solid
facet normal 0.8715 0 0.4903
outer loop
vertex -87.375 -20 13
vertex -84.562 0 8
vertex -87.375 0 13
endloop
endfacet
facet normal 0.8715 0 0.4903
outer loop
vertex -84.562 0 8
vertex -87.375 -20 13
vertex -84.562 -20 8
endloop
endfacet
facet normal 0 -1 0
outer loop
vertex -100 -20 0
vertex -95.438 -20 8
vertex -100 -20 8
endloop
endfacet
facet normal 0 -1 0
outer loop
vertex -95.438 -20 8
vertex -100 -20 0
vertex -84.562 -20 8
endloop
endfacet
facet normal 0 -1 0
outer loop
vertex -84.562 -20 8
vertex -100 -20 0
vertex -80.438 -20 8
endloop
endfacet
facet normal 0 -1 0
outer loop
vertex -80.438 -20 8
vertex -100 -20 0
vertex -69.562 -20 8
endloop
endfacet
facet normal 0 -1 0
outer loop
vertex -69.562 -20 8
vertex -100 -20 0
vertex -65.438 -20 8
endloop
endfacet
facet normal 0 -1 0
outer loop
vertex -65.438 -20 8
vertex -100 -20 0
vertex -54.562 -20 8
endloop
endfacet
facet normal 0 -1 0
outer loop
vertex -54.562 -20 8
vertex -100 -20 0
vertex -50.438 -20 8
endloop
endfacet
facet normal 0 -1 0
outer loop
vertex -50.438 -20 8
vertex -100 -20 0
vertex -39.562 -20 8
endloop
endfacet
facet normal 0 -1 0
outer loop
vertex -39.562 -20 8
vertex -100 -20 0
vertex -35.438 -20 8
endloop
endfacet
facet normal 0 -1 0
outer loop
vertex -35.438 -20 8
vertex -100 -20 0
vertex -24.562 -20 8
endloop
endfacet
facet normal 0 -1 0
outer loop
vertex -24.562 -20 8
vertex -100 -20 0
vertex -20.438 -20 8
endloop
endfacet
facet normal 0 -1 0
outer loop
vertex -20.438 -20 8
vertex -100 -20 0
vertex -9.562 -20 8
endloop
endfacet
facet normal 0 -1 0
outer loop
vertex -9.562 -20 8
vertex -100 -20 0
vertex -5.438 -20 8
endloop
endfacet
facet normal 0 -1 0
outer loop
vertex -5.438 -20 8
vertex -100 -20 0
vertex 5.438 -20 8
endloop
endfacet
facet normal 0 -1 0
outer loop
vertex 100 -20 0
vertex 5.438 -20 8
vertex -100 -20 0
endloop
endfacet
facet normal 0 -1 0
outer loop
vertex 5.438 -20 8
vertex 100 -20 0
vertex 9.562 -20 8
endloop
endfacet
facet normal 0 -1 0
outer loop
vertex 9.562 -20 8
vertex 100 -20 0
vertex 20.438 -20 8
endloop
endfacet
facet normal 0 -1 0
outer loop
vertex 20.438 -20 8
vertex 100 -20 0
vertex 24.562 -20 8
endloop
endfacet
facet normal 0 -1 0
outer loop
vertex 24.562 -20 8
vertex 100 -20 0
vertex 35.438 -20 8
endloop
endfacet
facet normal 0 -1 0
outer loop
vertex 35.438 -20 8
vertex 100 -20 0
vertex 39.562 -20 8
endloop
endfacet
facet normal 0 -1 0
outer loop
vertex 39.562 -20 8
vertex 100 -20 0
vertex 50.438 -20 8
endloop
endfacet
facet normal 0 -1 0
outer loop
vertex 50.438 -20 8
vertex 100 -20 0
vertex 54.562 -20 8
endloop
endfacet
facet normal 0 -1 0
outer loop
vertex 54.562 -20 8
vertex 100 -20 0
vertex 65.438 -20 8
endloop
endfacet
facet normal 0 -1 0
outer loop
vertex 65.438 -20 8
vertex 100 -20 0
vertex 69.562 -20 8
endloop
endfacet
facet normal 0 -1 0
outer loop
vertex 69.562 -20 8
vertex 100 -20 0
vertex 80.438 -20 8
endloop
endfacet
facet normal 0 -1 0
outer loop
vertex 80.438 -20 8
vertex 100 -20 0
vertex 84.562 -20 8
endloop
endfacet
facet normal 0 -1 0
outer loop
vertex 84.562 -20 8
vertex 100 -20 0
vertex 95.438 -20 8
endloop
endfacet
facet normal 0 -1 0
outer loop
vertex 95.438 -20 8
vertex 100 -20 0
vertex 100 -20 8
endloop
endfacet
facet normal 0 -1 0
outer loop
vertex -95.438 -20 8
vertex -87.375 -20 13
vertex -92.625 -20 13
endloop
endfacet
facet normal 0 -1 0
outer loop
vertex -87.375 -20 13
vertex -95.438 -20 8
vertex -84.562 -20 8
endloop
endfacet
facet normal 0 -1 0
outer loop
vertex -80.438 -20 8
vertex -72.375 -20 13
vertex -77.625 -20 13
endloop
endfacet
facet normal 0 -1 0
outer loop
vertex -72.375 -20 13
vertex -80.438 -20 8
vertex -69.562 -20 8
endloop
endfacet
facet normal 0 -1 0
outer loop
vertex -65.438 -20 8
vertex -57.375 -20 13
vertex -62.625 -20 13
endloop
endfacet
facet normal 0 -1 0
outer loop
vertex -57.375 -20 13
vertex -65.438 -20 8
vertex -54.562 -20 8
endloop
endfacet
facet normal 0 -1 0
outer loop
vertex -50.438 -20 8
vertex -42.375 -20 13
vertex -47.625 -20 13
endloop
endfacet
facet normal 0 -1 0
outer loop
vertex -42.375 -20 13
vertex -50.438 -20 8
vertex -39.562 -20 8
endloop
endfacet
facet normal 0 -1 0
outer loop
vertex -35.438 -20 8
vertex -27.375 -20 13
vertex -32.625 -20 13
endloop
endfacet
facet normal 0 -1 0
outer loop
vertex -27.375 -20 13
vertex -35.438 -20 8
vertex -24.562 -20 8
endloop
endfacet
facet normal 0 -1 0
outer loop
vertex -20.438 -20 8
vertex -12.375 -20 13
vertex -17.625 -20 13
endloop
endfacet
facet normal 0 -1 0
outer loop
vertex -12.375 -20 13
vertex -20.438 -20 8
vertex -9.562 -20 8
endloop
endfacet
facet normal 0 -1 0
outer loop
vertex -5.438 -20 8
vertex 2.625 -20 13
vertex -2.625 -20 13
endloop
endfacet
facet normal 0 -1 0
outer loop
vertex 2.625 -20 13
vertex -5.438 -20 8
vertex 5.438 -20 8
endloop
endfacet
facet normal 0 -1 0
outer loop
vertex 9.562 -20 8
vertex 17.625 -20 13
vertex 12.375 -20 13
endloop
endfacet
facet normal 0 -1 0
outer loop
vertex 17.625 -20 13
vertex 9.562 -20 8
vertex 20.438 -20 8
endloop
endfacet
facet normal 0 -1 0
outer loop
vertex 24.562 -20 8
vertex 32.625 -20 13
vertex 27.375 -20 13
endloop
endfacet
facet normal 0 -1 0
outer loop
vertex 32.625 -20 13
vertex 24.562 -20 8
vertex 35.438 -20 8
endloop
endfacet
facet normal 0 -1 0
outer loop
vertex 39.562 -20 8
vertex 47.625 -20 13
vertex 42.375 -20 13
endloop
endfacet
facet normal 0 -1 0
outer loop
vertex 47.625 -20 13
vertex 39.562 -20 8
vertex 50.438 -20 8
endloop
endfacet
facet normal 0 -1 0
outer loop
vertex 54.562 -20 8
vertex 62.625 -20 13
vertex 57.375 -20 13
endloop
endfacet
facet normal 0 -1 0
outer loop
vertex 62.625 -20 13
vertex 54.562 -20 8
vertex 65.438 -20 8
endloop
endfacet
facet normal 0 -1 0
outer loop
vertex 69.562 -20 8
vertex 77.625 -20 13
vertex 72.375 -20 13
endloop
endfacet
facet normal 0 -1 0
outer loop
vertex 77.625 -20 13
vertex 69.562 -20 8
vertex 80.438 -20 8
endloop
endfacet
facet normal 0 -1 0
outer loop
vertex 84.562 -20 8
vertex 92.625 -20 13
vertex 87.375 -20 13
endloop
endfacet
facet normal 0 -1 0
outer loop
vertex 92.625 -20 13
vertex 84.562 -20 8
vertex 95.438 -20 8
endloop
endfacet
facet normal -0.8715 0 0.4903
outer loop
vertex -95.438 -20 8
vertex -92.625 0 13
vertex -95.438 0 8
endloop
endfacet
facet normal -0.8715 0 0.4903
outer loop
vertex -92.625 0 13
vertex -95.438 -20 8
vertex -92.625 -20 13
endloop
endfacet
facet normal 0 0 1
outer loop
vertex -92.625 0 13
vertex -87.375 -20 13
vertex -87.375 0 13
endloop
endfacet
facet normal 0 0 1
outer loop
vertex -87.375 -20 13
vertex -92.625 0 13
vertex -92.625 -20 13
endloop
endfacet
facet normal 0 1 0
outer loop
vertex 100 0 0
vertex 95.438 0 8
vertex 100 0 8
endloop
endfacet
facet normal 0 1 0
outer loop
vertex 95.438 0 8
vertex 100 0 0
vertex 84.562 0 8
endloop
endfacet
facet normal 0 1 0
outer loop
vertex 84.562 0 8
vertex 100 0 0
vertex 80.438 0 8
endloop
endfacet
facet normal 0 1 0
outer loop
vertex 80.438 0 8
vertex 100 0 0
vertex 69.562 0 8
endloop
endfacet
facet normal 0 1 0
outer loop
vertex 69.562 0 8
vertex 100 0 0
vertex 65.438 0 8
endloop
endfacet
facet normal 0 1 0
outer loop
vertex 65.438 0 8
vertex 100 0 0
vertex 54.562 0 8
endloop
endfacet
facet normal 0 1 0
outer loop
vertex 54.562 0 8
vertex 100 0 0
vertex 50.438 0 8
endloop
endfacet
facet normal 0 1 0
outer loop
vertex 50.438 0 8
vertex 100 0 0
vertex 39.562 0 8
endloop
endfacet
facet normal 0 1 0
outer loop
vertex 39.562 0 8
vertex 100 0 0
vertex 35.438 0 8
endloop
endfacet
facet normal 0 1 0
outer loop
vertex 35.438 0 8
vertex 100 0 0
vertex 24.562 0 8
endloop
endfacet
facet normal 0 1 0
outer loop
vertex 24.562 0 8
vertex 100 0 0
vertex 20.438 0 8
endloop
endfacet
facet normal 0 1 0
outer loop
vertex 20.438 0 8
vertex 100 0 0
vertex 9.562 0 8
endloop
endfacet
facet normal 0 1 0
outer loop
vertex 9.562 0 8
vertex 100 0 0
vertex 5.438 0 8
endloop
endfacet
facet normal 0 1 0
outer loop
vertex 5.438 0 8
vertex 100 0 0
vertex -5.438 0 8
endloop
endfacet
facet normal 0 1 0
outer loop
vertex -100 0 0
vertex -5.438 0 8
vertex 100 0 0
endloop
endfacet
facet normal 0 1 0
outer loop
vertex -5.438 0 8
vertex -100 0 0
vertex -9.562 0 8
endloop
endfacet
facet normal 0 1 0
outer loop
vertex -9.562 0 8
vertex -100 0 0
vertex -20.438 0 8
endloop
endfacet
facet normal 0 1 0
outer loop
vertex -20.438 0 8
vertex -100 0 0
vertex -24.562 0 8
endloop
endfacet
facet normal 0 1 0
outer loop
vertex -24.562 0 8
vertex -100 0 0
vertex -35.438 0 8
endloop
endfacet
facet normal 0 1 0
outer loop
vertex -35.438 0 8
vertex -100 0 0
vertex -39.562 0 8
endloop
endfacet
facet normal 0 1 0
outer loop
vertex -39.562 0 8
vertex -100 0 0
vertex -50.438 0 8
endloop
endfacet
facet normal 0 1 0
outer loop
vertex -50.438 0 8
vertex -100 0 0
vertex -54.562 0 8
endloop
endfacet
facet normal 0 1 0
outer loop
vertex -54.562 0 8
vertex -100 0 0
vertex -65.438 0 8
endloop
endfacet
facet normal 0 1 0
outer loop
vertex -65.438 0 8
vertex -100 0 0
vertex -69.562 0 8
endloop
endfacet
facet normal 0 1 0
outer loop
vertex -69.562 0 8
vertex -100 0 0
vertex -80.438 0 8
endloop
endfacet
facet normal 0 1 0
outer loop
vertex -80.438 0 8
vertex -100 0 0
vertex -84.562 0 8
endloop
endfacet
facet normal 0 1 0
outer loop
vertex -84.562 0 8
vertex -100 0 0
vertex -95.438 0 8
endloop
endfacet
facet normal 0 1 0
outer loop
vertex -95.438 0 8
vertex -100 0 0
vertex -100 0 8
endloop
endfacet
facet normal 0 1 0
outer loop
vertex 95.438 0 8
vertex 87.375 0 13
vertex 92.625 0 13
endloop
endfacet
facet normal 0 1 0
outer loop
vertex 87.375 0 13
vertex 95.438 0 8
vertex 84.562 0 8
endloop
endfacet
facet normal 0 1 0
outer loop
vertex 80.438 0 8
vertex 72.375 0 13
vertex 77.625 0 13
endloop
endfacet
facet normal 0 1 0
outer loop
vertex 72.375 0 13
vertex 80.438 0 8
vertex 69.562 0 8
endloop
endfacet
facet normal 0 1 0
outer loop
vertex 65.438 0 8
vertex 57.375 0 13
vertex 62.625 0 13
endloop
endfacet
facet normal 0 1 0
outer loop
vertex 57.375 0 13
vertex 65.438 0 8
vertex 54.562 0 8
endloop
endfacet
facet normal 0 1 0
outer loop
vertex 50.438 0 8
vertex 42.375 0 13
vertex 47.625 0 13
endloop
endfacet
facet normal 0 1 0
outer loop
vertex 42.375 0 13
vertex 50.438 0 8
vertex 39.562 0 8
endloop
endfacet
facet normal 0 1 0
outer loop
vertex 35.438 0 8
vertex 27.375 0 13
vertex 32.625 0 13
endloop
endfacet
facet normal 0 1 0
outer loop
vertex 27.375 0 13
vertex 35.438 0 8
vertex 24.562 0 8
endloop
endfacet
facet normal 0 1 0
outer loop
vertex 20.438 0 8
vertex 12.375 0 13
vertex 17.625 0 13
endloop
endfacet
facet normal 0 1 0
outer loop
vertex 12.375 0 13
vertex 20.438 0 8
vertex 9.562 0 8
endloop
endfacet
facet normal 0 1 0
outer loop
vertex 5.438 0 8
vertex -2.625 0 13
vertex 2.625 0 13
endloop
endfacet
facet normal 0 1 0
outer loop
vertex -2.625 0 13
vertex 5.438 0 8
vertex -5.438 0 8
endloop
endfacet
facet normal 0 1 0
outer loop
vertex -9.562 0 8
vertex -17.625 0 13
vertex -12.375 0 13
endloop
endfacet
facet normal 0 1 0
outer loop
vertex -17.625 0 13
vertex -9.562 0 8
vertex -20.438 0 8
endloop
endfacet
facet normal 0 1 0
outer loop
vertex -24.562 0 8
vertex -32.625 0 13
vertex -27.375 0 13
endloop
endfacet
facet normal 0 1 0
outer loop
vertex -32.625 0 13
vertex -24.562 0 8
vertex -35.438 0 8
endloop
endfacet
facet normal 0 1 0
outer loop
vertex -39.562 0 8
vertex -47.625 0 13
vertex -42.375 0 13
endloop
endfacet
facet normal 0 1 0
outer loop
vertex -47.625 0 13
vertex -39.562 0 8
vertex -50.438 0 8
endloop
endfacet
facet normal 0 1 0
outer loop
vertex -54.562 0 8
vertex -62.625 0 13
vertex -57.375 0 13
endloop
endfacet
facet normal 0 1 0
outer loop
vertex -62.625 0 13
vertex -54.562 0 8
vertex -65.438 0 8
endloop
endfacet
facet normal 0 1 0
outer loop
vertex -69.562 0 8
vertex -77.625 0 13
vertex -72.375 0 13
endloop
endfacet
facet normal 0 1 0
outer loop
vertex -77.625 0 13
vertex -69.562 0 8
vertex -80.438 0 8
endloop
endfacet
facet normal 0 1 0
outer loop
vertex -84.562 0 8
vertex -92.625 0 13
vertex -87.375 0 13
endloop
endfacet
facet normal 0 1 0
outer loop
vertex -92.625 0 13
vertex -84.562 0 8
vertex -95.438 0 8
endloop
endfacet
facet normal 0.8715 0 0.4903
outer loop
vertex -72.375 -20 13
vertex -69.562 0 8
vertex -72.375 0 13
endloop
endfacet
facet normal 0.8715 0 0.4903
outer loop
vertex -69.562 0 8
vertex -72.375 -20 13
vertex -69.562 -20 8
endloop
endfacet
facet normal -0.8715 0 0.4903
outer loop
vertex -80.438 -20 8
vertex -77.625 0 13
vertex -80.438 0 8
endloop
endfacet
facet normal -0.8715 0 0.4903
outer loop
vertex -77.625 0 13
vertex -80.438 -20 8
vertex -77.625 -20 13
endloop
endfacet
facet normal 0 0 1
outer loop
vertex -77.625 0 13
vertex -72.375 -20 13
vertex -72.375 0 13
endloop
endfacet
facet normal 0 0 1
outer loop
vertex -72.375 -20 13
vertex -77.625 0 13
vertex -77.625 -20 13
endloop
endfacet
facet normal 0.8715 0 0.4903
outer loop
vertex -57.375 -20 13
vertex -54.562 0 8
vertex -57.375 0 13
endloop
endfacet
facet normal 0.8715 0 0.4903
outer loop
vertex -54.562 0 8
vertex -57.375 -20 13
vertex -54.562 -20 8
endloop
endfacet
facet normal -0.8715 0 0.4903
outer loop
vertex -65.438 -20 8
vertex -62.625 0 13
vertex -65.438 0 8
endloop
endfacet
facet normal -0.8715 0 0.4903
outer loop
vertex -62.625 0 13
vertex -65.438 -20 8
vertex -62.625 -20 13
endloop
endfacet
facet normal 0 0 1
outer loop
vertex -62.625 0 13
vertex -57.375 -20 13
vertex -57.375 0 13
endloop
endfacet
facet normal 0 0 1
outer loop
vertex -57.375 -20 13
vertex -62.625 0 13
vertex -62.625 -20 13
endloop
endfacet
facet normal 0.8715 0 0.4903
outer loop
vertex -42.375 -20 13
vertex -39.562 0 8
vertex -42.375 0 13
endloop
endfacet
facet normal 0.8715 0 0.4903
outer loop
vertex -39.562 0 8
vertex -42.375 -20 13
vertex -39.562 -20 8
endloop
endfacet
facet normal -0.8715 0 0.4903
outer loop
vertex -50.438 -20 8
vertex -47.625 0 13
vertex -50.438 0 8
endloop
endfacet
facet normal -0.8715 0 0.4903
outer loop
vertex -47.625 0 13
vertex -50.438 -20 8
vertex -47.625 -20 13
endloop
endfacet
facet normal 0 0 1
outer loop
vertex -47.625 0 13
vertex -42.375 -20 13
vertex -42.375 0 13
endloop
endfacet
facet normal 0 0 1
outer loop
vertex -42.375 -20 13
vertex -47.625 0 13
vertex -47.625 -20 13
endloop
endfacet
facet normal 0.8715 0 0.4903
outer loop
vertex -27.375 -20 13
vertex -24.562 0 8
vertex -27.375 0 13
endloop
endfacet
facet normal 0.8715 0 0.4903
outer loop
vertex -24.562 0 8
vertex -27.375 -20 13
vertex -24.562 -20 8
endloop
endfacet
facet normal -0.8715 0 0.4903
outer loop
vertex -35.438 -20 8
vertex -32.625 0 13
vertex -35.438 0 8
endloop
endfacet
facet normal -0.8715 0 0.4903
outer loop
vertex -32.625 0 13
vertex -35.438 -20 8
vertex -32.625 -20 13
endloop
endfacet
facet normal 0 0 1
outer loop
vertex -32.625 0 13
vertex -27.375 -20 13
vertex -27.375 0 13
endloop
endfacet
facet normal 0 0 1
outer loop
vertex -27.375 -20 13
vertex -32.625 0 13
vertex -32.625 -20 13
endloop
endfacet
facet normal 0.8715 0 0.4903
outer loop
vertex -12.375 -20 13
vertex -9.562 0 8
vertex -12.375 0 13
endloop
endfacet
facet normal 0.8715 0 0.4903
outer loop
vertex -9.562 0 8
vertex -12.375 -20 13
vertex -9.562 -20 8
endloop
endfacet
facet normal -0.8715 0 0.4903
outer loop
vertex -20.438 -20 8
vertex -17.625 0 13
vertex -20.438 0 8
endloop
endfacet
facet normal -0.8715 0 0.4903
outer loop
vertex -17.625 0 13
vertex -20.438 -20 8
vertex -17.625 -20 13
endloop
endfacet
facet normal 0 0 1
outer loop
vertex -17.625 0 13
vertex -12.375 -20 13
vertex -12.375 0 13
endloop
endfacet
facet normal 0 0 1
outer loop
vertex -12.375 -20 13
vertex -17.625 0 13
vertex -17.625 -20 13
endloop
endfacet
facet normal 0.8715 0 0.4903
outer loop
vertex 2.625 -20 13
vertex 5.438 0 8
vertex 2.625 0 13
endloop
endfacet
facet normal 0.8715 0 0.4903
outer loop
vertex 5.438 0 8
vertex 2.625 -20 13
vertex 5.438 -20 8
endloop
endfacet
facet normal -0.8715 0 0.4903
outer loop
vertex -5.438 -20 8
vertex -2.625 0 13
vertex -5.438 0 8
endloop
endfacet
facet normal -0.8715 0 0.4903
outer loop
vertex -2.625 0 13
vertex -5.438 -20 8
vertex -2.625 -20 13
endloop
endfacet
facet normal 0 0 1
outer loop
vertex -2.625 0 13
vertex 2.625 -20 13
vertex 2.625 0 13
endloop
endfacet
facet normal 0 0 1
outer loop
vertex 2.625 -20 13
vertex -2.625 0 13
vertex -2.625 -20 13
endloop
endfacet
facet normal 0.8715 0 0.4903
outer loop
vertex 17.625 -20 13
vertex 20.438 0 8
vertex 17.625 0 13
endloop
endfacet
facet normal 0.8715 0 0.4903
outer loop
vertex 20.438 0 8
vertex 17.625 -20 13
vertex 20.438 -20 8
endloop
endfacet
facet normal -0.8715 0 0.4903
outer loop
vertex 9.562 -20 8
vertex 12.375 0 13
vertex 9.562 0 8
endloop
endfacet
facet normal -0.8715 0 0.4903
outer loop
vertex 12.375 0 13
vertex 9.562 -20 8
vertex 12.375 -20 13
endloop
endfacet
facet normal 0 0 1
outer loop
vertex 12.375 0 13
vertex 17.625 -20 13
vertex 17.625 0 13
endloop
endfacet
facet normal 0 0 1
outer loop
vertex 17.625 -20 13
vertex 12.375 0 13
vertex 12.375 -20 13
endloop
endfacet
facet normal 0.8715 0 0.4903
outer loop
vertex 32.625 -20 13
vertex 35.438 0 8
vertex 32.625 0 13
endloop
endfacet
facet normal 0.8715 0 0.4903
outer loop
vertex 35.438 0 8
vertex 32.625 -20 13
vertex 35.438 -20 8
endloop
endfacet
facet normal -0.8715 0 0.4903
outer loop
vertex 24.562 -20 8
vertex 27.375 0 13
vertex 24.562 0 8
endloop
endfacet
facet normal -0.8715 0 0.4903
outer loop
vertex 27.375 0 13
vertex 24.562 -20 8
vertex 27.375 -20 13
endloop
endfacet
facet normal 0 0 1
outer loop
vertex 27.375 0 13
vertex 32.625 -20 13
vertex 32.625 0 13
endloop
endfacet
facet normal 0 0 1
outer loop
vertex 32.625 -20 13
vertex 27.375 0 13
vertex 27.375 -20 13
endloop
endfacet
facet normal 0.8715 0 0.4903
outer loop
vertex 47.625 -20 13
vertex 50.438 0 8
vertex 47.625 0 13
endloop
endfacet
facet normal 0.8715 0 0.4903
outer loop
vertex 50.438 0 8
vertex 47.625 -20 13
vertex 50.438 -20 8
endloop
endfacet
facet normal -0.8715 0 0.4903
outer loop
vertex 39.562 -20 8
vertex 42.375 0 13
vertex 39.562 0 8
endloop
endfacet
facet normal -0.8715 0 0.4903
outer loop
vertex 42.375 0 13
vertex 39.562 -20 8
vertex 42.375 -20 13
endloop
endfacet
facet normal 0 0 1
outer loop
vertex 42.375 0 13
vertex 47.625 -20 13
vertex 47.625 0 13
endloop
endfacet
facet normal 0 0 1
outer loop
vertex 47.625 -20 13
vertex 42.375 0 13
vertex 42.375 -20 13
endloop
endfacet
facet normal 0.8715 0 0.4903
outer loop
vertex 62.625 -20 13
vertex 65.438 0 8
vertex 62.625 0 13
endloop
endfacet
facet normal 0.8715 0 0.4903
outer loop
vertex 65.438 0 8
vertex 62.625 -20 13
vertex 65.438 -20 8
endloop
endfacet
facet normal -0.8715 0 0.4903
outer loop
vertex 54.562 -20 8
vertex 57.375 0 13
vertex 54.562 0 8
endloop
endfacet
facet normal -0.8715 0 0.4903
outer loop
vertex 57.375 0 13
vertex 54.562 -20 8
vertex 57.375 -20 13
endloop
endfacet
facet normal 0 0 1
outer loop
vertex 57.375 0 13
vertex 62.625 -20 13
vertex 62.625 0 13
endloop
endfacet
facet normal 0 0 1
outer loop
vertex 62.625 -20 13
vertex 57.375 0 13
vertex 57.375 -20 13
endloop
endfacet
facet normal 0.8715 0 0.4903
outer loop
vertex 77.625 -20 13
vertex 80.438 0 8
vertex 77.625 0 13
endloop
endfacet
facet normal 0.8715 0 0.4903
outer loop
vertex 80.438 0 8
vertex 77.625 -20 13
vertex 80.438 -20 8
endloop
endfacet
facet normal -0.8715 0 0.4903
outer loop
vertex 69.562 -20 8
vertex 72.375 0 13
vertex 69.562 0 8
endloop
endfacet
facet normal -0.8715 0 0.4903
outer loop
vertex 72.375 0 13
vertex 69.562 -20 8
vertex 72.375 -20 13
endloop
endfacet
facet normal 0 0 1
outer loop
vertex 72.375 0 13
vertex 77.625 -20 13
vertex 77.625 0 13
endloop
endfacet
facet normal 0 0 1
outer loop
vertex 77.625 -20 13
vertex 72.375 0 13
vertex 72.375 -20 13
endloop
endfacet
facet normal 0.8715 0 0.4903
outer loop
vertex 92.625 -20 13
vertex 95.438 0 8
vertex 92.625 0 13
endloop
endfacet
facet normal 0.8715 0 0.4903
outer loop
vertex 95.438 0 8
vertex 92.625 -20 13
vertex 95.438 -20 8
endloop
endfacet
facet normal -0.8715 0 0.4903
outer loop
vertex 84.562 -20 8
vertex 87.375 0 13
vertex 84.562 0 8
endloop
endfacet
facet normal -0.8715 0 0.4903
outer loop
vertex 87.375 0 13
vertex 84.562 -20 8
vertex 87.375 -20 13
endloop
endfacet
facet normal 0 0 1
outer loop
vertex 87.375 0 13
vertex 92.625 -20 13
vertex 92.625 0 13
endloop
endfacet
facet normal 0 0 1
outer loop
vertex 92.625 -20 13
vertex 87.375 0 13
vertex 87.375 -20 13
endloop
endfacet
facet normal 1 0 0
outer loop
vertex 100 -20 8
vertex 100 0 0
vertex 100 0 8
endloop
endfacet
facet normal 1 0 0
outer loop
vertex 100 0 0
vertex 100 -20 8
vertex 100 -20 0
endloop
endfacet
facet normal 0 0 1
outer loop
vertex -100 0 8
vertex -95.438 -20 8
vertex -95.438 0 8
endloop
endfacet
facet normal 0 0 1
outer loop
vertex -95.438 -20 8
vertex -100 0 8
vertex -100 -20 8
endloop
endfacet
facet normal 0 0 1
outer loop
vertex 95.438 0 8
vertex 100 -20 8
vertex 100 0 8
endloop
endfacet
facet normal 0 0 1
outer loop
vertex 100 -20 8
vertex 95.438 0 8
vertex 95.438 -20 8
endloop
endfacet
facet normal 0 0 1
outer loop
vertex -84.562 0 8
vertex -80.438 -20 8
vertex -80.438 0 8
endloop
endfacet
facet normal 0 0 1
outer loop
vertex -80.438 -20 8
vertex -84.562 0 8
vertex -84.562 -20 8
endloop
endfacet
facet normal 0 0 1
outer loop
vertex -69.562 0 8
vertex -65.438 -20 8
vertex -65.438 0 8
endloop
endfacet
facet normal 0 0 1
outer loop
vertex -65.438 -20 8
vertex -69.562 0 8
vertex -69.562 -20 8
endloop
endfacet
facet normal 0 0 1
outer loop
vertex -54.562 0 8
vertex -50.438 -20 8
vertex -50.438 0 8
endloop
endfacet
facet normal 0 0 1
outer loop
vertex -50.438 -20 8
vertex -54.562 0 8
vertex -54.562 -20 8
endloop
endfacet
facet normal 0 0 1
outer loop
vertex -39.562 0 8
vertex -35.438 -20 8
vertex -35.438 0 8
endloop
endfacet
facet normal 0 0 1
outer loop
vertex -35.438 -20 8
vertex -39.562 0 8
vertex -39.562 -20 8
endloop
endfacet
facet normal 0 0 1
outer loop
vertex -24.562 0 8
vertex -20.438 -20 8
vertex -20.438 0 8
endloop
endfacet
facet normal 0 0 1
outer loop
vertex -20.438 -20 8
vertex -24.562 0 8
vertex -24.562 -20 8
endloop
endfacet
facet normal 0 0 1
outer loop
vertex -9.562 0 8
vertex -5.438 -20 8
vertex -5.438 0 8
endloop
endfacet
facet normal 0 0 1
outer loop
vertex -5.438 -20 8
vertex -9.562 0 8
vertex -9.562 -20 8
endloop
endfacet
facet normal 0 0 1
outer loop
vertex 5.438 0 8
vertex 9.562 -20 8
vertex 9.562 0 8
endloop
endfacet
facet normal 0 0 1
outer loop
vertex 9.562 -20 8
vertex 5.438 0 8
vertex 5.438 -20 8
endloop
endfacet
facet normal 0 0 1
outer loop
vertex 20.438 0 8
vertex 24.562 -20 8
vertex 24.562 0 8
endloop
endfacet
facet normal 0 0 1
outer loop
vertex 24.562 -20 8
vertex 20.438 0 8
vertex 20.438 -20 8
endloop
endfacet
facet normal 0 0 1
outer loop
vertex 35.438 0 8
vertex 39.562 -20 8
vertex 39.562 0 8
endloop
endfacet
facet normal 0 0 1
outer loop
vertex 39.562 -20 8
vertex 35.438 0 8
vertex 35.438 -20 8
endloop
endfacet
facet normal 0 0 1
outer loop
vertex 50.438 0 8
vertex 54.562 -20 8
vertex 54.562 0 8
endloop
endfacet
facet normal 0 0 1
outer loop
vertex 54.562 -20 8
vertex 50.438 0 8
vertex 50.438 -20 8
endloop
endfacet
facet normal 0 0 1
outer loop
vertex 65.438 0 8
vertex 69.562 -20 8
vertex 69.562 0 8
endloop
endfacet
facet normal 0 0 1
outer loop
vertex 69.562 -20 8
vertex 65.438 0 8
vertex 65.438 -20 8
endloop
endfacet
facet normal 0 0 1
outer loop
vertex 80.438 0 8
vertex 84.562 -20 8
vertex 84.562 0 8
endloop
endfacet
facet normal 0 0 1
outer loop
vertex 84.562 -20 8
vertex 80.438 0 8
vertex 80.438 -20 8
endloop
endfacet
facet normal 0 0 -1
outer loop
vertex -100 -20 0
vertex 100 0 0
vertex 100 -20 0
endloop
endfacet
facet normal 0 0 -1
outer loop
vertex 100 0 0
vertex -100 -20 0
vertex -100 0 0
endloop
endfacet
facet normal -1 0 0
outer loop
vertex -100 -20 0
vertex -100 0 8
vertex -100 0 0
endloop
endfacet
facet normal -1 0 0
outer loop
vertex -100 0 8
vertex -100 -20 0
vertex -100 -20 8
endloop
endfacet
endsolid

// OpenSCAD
$fn = 32;

// ----------------------------------------------------------------------
// Toothed rack, 13 teeth
// 15 mm pitch, 5 mm teeth
// ----------------------------------------------------------------------

// --- parameters (mm) ---
bar_w = 20;      // bar width (Y)
bar_h = 8;       // bar height (Z)
teeth = 13;      // number of teeth
pitch = 15;      // tooth pitch
tooth_h = 5;     // tooth height above the bar
root_w = 12;     // tooth width at the root
crest_w = 5.25;  // tooth width at the crest

// --- derived feature positions (mm) ---
span = (teeth - 1) * pitch;  // = 180   distance between the outer teeth
bar_l = span + root_w + 8;   // = 200   bar length: teeth plus 4 mm at each end
tooth_x = -span / 2;         // = -90   X of the first tooth
height = bar_h + tooth_h;    // = 13   overall height
feature_centers = [
  [tooth_x + 0 * pitch, -bar_w / 2],
  [tooth_x + 1 * pitch, -bar_w / 2],
  [tooth_x + 2 * pitch, -bar_w / 2],
  [tooth_x + 3 * pitch, -bar_w / 2],
  [tooth_x + 4 * pitch, -bar_w / 2],
  [tooth_x + 5 * pitch, -bar_w / 2],
  [tooth_x + 6 * pitch, -bar_w / 2],
  [tooth_x + 7 * pitch, -bar_w / 2],
  [tooth_x + 8 * pitch, -bar_w / 2],
  [tooth_x + 9 * pitch, -bar_w / 2],
  [tooth_x + 10 * pitch, -bar_w / 2],
  [tooth_x + 11 * pitch, -bar_w / 2],
  [tooth_x + 12 * pitch, -bar_w / 2]
];   // tooth centre line, drives the tooth loop

// bar with a rack of teeth, one extruded trapezoium per centre
module rack_tooth() {
  linear_extrude(height = bar_w)
    polygon(points = [
      [0, 0],
      [root_w, 0],
      [root_w / 2 + crest_w / 2, tooth_h + 1],
      [root_w / 2 - crest_w / 2, tooth_h + 1]
    ]);
}

union() {
  translate([-bar_l / 2, -bar_w, 0]) cube([bar_l, bar_w, bar_h]);
  for (centre = feature_centers)
    translate([centre[0] - root_w / 2, 0, bar_h - 1]) rotate([90, 0, 0]) rack_tooth();
}
